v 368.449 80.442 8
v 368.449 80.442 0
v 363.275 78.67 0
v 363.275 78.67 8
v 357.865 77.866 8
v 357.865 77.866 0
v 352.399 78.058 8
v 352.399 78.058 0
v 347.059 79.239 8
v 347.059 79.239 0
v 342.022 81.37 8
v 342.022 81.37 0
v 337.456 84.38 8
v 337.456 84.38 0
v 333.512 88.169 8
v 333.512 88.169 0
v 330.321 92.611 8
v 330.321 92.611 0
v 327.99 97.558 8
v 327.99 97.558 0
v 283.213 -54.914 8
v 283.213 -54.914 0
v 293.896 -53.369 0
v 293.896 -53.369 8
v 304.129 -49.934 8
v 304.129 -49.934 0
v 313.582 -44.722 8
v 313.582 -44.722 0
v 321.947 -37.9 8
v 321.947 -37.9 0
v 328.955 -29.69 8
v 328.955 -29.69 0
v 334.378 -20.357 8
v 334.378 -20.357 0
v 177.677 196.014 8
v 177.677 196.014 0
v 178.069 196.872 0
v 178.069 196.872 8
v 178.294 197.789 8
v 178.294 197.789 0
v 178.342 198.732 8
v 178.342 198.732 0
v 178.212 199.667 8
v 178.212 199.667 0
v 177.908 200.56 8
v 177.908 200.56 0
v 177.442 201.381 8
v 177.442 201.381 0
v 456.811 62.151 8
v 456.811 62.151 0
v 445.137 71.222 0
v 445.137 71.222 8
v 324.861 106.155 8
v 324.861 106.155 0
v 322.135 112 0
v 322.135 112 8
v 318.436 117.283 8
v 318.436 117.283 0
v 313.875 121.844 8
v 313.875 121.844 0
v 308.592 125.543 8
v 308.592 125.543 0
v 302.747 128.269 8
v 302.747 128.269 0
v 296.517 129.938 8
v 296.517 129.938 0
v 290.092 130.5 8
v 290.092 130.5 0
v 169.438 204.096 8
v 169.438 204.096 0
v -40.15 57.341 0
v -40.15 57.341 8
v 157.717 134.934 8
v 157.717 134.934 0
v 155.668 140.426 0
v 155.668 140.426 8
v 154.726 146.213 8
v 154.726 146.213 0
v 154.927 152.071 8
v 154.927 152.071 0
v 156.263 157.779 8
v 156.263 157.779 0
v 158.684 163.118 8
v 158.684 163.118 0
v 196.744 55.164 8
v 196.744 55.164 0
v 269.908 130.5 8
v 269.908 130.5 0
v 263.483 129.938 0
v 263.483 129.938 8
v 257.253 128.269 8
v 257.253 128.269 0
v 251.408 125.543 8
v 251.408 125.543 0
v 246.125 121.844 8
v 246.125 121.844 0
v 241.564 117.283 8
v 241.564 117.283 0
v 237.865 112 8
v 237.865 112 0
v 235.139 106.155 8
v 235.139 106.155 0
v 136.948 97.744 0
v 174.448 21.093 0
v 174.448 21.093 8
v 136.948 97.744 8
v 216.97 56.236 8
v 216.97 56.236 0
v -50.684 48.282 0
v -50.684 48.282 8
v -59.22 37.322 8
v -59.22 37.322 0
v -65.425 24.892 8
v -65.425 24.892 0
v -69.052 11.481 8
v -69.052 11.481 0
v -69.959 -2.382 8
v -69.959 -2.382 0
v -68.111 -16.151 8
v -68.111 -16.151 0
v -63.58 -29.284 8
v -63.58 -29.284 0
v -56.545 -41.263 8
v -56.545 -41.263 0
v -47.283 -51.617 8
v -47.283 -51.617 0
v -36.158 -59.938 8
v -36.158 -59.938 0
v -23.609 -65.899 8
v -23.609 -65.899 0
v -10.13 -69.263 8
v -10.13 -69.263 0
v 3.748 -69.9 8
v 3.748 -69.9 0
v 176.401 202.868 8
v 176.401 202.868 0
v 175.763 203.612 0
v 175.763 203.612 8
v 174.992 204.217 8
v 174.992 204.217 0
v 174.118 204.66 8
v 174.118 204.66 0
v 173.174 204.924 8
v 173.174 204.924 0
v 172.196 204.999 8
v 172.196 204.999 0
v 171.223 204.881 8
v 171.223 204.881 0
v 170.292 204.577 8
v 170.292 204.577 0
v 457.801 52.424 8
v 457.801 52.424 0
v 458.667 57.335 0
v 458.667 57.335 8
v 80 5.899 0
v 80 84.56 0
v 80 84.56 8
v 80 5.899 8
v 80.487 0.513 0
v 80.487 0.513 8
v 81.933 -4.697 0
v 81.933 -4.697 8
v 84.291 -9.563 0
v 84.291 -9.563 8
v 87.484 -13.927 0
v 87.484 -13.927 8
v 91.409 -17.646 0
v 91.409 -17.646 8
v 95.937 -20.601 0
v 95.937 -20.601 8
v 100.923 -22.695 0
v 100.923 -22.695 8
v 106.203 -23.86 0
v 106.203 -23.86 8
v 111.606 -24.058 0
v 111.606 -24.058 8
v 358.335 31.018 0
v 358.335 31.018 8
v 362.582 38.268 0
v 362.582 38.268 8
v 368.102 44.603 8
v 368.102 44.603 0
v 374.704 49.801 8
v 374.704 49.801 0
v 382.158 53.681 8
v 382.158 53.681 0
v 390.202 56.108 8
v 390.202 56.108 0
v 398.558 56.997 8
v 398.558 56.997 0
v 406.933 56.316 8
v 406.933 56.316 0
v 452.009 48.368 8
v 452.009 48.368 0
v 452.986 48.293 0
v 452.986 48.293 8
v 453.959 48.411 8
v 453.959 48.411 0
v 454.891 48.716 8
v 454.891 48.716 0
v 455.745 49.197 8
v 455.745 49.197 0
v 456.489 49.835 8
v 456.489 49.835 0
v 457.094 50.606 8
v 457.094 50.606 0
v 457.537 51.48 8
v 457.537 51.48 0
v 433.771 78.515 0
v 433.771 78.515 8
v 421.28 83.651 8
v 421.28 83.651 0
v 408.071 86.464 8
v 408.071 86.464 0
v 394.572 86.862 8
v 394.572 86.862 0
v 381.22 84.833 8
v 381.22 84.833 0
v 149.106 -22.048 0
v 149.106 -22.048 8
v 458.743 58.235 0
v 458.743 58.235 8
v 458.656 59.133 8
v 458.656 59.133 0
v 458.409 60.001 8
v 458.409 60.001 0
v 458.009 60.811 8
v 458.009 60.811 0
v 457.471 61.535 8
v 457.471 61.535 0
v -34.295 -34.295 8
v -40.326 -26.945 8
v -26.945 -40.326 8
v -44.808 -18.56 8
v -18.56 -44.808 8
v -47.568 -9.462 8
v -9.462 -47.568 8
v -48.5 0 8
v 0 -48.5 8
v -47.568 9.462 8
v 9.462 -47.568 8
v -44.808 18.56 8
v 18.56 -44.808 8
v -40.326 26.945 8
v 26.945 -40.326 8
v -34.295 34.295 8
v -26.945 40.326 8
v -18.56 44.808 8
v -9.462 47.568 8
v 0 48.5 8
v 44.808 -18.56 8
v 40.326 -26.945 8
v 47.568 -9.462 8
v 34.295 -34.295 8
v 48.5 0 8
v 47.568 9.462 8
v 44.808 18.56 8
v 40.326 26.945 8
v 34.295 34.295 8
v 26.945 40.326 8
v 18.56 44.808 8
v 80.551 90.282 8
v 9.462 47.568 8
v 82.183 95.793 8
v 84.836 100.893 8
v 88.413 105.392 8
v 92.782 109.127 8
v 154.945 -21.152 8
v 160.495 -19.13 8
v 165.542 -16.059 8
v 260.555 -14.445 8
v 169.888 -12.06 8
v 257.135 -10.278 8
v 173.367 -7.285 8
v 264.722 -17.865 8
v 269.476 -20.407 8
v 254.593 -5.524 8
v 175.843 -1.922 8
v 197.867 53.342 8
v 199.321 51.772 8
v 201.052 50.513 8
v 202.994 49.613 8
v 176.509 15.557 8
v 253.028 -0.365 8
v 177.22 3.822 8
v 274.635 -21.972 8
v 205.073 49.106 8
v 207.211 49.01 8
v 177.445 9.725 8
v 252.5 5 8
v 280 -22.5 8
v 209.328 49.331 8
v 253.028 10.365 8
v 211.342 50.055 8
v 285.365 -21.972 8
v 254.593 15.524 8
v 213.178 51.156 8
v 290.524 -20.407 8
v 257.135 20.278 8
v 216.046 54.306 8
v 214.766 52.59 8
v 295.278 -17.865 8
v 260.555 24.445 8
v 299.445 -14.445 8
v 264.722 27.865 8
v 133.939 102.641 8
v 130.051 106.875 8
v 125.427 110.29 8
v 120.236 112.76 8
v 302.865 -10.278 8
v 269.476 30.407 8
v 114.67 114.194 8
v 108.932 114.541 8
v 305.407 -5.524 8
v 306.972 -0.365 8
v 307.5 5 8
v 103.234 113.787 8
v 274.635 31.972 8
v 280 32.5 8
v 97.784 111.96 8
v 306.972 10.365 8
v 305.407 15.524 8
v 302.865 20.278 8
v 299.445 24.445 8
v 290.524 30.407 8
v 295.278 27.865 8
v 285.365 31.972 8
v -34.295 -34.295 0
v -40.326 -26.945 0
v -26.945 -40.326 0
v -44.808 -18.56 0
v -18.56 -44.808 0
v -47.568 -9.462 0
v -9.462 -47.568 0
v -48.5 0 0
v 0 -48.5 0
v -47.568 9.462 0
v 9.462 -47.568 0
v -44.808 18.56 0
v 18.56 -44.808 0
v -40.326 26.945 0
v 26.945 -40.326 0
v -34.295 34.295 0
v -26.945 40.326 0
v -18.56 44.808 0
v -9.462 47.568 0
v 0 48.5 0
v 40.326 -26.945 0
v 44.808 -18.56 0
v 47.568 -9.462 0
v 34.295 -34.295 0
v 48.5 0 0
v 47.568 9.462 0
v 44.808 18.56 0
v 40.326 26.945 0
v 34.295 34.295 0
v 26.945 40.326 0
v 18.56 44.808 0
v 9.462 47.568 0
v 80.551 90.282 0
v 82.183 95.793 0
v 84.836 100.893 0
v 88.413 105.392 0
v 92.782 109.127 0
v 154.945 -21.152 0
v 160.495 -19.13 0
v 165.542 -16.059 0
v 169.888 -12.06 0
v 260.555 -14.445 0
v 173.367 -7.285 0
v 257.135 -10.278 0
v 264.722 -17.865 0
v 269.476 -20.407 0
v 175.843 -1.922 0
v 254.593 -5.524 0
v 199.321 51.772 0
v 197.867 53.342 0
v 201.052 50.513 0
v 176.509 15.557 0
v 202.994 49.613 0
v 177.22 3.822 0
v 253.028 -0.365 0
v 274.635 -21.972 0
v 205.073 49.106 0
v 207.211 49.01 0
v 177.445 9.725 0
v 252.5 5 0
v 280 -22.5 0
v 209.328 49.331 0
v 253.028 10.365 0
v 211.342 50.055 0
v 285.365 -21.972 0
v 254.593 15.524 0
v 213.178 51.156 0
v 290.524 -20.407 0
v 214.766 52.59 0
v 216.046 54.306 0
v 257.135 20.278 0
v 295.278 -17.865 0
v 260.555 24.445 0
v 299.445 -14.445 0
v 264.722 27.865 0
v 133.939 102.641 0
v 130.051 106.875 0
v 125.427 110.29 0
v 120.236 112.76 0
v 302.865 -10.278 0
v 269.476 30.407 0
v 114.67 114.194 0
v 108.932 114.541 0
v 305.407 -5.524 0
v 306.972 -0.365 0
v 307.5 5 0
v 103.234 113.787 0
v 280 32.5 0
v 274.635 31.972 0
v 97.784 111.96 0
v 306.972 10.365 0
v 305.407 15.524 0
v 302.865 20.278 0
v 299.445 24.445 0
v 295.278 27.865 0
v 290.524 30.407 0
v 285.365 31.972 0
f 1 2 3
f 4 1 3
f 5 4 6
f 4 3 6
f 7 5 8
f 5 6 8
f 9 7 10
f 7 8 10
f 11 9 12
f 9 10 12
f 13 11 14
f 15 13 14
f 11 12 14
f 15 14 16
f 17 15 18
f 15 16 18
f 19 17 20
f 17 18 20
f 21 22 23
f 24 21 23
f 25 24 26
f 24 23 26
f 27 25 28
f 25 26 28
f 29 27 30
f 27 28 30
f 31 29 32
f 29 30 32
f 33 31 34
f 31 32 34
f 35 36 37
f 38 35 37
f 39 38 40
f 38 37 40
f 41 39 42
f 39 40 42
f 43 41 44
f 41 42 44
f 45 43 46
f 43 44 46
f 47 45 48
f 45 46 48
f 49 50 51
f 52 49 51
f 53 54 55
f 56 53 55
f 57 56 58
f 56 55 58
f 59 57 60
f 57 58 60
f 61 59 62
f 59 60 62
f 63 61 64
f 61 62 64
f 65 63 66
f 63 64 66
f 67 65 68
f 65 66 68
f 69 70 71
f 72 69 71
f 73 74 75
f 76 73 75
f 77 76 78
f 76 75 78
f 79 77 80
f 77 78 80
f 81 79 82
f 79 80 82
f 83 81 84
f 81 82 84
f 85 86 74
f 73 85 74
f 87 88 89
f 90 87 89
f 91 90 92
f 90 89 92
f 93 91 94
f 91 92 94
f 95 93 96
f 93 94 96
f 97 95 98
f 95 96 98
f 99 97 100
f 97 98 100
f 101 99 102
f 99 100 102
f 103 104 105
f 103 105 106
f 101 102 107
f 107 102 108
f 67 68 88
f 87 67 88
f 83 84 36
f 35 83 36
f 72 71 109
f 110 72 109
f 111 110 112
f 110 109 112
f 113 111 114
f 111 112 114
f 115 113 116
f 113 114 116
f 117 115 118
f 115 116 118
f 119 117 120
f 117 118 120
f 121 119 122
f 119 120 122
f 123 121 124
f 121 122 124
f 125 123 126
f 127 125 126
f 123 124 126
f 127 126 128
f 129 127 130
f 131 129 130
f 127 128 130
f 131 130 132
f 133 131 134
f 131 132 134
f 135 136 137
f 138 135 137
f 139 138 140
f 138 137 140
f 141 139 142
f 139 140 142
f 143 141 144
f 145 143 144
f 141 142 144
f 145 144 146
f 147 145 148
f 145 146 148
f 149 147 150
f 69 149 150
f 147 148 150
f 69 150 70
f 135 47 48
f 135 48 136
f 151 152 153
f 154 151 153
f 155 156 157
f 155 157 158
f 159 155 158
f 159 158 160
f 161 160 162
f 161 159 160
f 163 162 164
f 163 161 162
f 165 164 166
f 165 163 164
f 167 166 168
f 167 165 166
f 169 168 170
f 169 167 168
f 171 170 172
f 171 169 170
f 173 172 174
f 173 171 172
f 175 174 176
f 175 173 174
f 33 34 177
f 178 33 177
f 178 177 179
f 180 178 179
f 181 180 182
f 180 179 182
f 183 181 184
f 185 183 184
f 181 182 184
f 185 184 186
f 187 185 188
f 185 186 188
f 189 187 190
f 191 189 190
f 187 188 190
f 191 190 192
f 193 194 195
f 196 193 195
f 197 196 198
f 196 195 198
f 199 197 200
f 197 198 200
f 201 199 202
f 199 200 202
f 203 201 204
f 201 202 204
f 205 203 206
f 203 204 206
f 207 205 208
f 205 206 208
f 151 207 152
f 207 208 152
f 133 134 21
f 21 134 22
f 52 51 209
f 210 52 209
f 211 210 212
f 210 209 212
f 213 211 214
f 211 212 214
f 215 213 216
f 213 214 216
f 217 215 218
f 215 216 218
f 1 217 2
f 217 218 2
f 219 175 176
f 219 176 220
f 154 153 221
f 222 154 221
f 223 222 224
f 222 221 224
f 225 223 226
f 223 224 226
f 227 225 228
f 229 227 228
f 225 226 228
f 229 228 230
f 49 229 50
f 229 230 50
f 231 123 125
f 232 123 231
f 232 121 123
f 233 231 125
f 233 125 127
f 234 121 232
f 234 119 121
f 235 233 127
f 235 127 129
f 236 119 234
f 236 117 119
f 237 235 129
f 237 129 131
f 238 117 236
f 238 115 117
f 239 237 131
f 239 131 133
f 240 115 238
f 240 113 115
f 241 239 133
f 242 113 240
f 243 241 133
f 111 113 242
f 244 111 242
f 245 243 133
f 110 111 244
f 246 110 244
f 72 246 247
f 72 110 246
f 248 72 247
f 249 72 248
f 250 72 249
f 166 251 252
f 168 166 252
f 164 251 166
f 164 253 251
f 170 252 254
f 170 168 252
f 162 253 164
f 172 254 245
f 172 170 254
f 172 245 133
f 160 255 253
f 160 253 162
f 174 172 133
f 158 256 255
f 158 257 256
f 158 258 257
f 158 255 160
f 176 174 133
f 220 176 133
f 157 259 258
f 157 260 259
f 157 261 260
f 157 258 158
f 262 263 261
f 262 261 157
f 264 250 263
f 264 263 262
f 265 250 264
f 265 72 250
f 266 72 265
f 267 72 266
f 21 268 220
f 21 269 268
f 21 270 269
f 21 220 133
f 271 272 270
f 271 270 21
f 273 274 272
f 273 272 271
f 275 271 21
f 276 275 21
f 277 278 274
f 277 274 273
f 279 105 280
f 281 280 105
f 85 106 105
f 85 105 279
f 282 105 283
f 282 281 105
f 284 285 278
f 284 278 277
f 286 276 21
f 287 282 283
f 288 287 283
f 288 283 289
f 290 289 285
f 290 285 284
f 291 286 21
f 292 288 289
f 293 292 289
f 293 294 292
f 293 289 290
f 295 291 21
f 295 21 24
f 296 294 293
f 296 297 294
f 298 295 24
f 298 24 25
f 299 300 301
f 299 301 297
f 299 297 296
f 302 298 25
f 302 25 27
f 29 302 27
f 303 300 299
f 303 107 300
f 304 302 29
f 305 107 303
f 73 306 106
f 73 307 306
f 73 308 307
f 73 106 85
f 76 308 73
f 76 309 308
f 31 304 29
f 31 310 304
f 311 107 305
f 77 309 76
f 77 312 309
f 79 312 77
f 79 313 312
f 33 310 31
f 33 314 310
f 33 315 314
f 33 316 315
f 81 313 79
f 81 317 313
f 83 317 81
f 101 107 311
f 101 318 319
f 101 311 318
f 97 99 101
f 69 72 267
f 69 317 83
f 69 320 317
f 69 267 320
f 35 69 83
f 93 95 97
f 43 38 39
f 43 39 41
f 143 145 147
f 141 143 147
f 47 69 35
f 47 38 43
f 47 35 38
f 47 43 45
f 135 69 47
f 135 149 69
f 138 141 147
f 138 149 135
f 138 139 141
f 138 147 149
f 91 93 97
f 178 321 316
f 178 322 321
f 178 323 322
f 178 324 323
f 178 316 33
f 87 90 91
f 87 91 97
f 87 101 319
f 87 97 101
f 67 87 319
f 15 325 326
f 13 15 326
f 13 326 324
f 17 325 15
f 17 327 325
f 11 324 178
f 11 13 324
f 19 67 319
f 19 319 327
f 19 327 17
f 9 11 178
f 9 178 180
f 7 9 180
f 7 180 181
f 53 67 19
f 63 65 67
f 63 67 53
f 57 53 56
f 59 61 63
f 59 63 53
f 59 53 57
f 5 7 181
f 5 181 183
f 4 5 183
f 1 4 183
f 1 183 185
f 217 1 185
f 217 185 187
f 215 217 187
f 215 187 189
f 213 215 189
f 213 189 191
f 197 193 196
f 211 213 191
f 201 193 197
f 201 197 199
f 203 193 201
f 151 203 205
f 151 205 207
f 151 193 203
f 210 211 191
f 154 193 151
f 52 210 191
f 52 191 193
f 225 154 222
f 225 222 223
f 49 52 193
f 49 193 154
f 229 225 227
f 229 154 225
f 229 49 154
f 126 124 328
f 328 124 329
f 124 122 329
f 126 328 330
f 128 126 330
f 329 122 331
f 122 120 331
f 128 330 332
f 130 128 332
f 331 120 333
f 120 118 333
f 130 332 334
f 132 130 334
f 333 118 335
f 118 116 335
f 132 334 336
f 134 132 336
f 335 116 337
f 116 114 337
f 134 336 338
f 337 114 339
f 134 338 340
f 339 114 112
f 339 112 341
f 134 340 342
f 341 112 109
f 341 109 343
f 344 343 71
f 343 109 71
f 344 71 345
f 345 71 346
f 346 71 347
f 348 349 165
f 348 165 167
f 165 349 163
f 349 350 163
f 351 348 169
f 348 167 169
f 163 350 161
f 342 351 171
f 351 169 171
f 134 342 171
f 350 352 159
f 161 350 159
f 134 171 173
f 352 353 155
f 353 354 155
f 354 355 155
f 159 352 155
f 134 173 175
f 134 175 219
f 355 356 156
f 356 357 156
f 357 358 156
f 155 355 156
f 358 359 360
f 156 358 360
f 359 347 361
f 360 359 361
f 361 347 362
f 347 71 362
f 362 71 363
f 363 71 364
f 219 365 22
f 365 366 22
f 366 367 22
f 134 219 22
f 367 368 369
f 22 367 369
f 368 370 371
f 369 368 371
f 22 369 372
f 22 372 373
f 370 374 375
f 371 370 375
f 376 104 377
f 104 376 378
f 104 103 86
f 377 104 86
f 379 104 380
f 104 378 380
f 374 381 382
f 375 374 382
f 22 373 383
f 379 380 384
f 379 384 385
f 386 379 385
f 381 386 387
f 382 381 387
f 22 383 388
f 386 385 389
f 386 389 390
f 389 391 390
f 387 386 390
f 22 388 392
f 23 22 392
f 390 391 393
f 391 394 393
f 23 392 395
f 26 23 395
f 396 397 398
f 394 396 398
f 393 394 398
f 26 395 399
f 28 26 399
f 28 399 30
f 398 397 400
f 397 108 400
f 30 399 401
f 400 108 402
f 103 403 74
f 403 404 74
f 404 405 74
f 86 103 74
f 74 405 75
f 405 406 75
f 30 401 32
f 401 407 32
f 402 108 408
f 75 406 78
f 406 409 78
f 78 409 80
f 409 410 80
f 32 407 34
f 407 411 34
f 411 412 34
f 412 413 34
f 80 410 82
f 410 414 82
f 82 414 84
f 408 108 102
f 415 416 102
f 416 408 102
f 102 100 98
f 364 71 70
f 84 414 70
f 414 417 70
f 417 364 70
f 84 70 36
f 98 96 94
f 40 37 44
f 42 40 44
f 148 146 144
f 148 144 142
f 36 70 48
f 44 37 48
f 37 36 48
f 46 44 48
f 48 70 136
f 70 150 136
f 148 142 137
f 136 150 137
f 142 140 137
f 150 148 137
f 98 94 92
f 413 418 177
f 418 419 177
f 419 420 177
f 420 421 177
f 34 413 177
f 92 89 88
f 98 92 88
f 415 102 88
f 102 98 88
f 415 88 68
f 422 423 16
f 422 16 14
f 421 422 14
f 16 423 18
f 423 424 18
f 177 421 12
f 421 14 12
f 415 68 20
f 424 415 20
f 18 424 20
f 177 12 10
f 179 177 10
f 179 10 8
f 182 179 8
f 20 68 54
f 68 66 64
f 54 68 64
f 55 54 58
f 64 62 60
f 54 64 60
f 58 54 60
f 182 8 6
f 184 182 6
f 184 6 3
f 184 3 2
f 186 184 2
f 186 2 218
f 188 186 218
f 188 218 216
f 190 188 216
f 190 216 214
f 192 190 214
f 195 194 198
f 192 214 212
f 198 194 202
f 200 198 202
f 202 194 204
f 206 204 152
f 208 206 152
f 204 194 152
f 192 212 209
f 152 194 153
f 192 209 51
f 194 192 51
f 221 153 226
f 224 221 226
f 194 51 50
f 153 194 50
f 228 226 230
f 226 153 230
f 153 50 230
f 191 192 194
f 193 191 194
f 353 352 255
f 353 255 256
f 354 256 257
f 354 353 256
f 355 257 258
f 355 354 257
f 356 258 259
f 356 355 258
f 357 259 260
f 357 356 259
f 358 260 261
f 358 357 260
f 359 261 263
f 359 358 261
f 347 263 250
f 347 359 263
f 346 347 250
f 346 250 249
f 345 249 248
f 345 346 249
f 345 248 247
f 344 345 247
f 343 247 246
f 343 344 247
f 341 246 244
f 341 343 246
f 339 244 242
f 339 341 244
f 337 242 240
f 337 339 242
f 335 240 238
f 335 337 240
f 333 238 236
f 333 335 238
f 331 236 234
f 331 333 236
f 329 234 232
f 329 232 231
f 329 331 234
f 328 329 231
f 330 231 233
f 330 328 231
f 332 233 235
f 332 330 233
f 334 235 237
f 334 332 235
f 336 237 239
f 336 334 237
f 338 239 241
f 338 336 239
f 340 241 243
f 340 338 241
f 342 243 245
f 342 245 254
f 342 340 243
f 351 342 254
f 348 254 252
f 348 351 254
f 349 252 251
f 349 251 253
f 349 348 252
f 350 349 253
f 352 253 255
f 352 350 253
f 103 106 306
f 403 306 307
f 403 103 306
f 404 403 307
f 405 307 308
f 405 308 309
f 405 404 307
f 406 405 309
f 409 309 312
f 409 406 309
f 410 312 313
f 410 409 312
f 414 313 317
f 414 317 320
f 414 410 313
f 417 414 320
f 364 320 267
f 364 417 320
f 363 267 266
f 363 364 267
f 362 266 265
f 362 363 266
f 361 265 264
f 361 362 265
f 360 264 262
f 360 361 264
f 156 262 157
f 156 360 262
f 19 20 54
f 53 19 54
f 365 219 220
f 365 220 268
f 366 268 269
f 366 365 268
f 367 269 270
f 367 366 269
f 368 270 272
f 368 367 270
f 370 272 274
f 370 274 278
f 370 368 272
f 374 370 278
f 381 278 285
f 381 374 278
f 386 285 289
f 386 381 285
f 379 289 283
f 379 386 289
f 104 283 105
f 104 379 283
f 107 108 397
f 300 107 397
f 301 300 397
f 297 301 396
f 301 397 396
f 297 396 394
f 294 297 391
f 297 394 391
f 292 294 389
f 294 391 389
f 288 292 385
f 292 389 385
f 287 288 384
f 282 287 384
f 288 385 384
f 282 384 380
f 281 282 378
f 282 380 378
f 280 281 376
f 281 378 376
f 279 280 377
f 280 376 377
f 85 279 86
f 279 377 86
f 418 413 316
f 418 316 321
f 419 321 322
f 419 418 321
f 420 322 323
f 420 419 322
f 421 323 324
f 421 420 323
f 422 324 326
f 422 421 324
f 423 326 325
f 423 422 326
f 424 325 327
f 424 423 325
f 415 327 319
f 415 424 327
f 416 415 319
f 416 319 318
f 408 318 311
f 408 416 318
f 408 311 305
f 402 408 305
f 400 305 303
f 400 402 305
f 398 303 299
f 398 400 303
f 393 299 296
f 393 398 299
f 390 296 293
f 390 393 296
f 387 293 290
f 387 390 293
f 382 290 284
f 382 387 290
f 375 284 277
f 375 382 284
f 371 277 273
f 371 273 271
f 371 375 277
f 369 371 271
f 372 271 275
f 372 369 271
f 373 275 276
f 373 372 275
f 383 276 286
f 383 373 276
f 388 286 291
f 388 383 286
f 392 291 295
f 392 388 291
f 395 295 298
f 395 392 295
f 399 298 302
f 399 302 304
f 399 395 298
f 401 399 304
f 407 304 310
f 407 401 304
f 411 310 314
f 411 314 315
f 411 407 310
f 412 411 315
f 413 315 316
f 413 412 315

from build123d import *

# Parameters (mm, degrees)
SKETCH1_R          = 48.5
SKETCH1_R_2        = 27.5
BASE_EXTRUDE_DEPTH = 8


with BuildPart() as part:
    # Sketch1 → Base-Extrude (new body)
    with BuildSketch(Plane.XY):
        with BuildLine():
            Line((456.811048982, 62.151395165), (445.137482247, 71.222327839))
            ThreePointArc((445.137482247, 71.222327839), (408.071209791, 86.463783058), (368.448599855, 80.442214094))
            ThreePointArc((368.448599855, 80.442214094), (344.491847052, 80.189853314), (327.989727135, 97.558495432))
            Line((327.989727135, 97.558495432), (324.860948055, 106.154745303))
            ThreePointArc((324.860948055, 106.154745303), (311.314649231, 123.808625639), (290.092321086, 130.5))
            Line((290.092321086, 130.5), (269.907678914, 130.5))
            ThreePointArc((269.907678914, 130.5), (248.685350769, 123.808625639), (235.139051945, 106.154745303))
            Line((235.139051945, 106.154745303), (216.970143635, 56.236079987))
            ThreePointArc((216.970143635, 56.236079987), (207.211471113, 49.010466943), (196.743512668, 55.163760308))
            Line((196.743512668, 55.163760308), (157.717167982, 134.93418817))
            ThreePointArc((157.717167982, 134.93418817), (154.682682734, 149.146803503), (158.684274169, 163.117981024))
            Line((158.684274169, 163.117981024), (177.676526384, 196.013526811))
            ThreePointArc((177.676526384, 196.013526811), (178.341640473, 198.731623748), (177.442159587, 201.381408993))
            Line((177.442159587, 201.381408993), (176.401319854, 202.867882182))
            ThreePointArc((176.401319854, 202.867882182), (173.173800521, 204.924038765), (169.437677451, 204.095760221))
            Line((169.437677451, 204.095760221), (-40.150350545, 57.3406431))
            ThreePointArc((-40.150350545, 57.3406431), (-66.172482636, -22.829860749), (3.748206743, -69.899577583))
            Line((3.748206743, -69.899577583), (283.212748636, -54.913923642))
            ThreePointArc((283.212748636, -54.913923642), (313.581700751, -44.721920465), (334.378467222, -20.357095704))
            Line((334.378467222, -20.357095704), (358.334984681, 31.017821778))
            ThreePointArc((358.334984681, 31.017821778), (378.340147503, 51.915487493), (406.933003093, 56.316348886))
            Line((406.933003093, 56.316348886), (452.008963478, 48.368240888))
            ThreePointArc((452.008963478, 48.368240888), (455.745086548, 49.196519432), (457.801243132, 52.424038765))
            Line((457.801243132, 52.424038765), (458.667177938, 57.334999088))
            ThreePointArc((458.667177938, 57.334999088), (458.408675401, 60.001230994), (456.811048982, 62.151395165))
        make_face()
        Circle(SKETCH1_R, mode=Mode.SUBTRACT)
        with Locations((280, 5)):
            Circle(SKETCH1_R_2, mode=Mode.SUBTRACT)
        with BuildLine():
            Line((111.606374318, -24.058460629), (149.106374318, -22.04760795))
            ThreePointArc((149.106374318, -22.04760795), (173.367303133, -7.285468557), (174.447868301, 21.093146726))
            Line((174.447868301, 21.093146726), (136.947868301, 97.743703391))
            ThreePointArc((136.947868301, 97.743703391), (103.233762088, 113.786919013), (80, 84.559910536))
            Line((80, 84.559910536), (80, 5.898501192))
            ThreePointArc((80, 5.898501192), (89.362548965, -15.875235621), (111.606374318, -24.058460629))
        make_face(mode=Mode.SUBTRACT)
    extrude(amount=BASE_EXTRUDE_DEPTH)


solid = part.part
